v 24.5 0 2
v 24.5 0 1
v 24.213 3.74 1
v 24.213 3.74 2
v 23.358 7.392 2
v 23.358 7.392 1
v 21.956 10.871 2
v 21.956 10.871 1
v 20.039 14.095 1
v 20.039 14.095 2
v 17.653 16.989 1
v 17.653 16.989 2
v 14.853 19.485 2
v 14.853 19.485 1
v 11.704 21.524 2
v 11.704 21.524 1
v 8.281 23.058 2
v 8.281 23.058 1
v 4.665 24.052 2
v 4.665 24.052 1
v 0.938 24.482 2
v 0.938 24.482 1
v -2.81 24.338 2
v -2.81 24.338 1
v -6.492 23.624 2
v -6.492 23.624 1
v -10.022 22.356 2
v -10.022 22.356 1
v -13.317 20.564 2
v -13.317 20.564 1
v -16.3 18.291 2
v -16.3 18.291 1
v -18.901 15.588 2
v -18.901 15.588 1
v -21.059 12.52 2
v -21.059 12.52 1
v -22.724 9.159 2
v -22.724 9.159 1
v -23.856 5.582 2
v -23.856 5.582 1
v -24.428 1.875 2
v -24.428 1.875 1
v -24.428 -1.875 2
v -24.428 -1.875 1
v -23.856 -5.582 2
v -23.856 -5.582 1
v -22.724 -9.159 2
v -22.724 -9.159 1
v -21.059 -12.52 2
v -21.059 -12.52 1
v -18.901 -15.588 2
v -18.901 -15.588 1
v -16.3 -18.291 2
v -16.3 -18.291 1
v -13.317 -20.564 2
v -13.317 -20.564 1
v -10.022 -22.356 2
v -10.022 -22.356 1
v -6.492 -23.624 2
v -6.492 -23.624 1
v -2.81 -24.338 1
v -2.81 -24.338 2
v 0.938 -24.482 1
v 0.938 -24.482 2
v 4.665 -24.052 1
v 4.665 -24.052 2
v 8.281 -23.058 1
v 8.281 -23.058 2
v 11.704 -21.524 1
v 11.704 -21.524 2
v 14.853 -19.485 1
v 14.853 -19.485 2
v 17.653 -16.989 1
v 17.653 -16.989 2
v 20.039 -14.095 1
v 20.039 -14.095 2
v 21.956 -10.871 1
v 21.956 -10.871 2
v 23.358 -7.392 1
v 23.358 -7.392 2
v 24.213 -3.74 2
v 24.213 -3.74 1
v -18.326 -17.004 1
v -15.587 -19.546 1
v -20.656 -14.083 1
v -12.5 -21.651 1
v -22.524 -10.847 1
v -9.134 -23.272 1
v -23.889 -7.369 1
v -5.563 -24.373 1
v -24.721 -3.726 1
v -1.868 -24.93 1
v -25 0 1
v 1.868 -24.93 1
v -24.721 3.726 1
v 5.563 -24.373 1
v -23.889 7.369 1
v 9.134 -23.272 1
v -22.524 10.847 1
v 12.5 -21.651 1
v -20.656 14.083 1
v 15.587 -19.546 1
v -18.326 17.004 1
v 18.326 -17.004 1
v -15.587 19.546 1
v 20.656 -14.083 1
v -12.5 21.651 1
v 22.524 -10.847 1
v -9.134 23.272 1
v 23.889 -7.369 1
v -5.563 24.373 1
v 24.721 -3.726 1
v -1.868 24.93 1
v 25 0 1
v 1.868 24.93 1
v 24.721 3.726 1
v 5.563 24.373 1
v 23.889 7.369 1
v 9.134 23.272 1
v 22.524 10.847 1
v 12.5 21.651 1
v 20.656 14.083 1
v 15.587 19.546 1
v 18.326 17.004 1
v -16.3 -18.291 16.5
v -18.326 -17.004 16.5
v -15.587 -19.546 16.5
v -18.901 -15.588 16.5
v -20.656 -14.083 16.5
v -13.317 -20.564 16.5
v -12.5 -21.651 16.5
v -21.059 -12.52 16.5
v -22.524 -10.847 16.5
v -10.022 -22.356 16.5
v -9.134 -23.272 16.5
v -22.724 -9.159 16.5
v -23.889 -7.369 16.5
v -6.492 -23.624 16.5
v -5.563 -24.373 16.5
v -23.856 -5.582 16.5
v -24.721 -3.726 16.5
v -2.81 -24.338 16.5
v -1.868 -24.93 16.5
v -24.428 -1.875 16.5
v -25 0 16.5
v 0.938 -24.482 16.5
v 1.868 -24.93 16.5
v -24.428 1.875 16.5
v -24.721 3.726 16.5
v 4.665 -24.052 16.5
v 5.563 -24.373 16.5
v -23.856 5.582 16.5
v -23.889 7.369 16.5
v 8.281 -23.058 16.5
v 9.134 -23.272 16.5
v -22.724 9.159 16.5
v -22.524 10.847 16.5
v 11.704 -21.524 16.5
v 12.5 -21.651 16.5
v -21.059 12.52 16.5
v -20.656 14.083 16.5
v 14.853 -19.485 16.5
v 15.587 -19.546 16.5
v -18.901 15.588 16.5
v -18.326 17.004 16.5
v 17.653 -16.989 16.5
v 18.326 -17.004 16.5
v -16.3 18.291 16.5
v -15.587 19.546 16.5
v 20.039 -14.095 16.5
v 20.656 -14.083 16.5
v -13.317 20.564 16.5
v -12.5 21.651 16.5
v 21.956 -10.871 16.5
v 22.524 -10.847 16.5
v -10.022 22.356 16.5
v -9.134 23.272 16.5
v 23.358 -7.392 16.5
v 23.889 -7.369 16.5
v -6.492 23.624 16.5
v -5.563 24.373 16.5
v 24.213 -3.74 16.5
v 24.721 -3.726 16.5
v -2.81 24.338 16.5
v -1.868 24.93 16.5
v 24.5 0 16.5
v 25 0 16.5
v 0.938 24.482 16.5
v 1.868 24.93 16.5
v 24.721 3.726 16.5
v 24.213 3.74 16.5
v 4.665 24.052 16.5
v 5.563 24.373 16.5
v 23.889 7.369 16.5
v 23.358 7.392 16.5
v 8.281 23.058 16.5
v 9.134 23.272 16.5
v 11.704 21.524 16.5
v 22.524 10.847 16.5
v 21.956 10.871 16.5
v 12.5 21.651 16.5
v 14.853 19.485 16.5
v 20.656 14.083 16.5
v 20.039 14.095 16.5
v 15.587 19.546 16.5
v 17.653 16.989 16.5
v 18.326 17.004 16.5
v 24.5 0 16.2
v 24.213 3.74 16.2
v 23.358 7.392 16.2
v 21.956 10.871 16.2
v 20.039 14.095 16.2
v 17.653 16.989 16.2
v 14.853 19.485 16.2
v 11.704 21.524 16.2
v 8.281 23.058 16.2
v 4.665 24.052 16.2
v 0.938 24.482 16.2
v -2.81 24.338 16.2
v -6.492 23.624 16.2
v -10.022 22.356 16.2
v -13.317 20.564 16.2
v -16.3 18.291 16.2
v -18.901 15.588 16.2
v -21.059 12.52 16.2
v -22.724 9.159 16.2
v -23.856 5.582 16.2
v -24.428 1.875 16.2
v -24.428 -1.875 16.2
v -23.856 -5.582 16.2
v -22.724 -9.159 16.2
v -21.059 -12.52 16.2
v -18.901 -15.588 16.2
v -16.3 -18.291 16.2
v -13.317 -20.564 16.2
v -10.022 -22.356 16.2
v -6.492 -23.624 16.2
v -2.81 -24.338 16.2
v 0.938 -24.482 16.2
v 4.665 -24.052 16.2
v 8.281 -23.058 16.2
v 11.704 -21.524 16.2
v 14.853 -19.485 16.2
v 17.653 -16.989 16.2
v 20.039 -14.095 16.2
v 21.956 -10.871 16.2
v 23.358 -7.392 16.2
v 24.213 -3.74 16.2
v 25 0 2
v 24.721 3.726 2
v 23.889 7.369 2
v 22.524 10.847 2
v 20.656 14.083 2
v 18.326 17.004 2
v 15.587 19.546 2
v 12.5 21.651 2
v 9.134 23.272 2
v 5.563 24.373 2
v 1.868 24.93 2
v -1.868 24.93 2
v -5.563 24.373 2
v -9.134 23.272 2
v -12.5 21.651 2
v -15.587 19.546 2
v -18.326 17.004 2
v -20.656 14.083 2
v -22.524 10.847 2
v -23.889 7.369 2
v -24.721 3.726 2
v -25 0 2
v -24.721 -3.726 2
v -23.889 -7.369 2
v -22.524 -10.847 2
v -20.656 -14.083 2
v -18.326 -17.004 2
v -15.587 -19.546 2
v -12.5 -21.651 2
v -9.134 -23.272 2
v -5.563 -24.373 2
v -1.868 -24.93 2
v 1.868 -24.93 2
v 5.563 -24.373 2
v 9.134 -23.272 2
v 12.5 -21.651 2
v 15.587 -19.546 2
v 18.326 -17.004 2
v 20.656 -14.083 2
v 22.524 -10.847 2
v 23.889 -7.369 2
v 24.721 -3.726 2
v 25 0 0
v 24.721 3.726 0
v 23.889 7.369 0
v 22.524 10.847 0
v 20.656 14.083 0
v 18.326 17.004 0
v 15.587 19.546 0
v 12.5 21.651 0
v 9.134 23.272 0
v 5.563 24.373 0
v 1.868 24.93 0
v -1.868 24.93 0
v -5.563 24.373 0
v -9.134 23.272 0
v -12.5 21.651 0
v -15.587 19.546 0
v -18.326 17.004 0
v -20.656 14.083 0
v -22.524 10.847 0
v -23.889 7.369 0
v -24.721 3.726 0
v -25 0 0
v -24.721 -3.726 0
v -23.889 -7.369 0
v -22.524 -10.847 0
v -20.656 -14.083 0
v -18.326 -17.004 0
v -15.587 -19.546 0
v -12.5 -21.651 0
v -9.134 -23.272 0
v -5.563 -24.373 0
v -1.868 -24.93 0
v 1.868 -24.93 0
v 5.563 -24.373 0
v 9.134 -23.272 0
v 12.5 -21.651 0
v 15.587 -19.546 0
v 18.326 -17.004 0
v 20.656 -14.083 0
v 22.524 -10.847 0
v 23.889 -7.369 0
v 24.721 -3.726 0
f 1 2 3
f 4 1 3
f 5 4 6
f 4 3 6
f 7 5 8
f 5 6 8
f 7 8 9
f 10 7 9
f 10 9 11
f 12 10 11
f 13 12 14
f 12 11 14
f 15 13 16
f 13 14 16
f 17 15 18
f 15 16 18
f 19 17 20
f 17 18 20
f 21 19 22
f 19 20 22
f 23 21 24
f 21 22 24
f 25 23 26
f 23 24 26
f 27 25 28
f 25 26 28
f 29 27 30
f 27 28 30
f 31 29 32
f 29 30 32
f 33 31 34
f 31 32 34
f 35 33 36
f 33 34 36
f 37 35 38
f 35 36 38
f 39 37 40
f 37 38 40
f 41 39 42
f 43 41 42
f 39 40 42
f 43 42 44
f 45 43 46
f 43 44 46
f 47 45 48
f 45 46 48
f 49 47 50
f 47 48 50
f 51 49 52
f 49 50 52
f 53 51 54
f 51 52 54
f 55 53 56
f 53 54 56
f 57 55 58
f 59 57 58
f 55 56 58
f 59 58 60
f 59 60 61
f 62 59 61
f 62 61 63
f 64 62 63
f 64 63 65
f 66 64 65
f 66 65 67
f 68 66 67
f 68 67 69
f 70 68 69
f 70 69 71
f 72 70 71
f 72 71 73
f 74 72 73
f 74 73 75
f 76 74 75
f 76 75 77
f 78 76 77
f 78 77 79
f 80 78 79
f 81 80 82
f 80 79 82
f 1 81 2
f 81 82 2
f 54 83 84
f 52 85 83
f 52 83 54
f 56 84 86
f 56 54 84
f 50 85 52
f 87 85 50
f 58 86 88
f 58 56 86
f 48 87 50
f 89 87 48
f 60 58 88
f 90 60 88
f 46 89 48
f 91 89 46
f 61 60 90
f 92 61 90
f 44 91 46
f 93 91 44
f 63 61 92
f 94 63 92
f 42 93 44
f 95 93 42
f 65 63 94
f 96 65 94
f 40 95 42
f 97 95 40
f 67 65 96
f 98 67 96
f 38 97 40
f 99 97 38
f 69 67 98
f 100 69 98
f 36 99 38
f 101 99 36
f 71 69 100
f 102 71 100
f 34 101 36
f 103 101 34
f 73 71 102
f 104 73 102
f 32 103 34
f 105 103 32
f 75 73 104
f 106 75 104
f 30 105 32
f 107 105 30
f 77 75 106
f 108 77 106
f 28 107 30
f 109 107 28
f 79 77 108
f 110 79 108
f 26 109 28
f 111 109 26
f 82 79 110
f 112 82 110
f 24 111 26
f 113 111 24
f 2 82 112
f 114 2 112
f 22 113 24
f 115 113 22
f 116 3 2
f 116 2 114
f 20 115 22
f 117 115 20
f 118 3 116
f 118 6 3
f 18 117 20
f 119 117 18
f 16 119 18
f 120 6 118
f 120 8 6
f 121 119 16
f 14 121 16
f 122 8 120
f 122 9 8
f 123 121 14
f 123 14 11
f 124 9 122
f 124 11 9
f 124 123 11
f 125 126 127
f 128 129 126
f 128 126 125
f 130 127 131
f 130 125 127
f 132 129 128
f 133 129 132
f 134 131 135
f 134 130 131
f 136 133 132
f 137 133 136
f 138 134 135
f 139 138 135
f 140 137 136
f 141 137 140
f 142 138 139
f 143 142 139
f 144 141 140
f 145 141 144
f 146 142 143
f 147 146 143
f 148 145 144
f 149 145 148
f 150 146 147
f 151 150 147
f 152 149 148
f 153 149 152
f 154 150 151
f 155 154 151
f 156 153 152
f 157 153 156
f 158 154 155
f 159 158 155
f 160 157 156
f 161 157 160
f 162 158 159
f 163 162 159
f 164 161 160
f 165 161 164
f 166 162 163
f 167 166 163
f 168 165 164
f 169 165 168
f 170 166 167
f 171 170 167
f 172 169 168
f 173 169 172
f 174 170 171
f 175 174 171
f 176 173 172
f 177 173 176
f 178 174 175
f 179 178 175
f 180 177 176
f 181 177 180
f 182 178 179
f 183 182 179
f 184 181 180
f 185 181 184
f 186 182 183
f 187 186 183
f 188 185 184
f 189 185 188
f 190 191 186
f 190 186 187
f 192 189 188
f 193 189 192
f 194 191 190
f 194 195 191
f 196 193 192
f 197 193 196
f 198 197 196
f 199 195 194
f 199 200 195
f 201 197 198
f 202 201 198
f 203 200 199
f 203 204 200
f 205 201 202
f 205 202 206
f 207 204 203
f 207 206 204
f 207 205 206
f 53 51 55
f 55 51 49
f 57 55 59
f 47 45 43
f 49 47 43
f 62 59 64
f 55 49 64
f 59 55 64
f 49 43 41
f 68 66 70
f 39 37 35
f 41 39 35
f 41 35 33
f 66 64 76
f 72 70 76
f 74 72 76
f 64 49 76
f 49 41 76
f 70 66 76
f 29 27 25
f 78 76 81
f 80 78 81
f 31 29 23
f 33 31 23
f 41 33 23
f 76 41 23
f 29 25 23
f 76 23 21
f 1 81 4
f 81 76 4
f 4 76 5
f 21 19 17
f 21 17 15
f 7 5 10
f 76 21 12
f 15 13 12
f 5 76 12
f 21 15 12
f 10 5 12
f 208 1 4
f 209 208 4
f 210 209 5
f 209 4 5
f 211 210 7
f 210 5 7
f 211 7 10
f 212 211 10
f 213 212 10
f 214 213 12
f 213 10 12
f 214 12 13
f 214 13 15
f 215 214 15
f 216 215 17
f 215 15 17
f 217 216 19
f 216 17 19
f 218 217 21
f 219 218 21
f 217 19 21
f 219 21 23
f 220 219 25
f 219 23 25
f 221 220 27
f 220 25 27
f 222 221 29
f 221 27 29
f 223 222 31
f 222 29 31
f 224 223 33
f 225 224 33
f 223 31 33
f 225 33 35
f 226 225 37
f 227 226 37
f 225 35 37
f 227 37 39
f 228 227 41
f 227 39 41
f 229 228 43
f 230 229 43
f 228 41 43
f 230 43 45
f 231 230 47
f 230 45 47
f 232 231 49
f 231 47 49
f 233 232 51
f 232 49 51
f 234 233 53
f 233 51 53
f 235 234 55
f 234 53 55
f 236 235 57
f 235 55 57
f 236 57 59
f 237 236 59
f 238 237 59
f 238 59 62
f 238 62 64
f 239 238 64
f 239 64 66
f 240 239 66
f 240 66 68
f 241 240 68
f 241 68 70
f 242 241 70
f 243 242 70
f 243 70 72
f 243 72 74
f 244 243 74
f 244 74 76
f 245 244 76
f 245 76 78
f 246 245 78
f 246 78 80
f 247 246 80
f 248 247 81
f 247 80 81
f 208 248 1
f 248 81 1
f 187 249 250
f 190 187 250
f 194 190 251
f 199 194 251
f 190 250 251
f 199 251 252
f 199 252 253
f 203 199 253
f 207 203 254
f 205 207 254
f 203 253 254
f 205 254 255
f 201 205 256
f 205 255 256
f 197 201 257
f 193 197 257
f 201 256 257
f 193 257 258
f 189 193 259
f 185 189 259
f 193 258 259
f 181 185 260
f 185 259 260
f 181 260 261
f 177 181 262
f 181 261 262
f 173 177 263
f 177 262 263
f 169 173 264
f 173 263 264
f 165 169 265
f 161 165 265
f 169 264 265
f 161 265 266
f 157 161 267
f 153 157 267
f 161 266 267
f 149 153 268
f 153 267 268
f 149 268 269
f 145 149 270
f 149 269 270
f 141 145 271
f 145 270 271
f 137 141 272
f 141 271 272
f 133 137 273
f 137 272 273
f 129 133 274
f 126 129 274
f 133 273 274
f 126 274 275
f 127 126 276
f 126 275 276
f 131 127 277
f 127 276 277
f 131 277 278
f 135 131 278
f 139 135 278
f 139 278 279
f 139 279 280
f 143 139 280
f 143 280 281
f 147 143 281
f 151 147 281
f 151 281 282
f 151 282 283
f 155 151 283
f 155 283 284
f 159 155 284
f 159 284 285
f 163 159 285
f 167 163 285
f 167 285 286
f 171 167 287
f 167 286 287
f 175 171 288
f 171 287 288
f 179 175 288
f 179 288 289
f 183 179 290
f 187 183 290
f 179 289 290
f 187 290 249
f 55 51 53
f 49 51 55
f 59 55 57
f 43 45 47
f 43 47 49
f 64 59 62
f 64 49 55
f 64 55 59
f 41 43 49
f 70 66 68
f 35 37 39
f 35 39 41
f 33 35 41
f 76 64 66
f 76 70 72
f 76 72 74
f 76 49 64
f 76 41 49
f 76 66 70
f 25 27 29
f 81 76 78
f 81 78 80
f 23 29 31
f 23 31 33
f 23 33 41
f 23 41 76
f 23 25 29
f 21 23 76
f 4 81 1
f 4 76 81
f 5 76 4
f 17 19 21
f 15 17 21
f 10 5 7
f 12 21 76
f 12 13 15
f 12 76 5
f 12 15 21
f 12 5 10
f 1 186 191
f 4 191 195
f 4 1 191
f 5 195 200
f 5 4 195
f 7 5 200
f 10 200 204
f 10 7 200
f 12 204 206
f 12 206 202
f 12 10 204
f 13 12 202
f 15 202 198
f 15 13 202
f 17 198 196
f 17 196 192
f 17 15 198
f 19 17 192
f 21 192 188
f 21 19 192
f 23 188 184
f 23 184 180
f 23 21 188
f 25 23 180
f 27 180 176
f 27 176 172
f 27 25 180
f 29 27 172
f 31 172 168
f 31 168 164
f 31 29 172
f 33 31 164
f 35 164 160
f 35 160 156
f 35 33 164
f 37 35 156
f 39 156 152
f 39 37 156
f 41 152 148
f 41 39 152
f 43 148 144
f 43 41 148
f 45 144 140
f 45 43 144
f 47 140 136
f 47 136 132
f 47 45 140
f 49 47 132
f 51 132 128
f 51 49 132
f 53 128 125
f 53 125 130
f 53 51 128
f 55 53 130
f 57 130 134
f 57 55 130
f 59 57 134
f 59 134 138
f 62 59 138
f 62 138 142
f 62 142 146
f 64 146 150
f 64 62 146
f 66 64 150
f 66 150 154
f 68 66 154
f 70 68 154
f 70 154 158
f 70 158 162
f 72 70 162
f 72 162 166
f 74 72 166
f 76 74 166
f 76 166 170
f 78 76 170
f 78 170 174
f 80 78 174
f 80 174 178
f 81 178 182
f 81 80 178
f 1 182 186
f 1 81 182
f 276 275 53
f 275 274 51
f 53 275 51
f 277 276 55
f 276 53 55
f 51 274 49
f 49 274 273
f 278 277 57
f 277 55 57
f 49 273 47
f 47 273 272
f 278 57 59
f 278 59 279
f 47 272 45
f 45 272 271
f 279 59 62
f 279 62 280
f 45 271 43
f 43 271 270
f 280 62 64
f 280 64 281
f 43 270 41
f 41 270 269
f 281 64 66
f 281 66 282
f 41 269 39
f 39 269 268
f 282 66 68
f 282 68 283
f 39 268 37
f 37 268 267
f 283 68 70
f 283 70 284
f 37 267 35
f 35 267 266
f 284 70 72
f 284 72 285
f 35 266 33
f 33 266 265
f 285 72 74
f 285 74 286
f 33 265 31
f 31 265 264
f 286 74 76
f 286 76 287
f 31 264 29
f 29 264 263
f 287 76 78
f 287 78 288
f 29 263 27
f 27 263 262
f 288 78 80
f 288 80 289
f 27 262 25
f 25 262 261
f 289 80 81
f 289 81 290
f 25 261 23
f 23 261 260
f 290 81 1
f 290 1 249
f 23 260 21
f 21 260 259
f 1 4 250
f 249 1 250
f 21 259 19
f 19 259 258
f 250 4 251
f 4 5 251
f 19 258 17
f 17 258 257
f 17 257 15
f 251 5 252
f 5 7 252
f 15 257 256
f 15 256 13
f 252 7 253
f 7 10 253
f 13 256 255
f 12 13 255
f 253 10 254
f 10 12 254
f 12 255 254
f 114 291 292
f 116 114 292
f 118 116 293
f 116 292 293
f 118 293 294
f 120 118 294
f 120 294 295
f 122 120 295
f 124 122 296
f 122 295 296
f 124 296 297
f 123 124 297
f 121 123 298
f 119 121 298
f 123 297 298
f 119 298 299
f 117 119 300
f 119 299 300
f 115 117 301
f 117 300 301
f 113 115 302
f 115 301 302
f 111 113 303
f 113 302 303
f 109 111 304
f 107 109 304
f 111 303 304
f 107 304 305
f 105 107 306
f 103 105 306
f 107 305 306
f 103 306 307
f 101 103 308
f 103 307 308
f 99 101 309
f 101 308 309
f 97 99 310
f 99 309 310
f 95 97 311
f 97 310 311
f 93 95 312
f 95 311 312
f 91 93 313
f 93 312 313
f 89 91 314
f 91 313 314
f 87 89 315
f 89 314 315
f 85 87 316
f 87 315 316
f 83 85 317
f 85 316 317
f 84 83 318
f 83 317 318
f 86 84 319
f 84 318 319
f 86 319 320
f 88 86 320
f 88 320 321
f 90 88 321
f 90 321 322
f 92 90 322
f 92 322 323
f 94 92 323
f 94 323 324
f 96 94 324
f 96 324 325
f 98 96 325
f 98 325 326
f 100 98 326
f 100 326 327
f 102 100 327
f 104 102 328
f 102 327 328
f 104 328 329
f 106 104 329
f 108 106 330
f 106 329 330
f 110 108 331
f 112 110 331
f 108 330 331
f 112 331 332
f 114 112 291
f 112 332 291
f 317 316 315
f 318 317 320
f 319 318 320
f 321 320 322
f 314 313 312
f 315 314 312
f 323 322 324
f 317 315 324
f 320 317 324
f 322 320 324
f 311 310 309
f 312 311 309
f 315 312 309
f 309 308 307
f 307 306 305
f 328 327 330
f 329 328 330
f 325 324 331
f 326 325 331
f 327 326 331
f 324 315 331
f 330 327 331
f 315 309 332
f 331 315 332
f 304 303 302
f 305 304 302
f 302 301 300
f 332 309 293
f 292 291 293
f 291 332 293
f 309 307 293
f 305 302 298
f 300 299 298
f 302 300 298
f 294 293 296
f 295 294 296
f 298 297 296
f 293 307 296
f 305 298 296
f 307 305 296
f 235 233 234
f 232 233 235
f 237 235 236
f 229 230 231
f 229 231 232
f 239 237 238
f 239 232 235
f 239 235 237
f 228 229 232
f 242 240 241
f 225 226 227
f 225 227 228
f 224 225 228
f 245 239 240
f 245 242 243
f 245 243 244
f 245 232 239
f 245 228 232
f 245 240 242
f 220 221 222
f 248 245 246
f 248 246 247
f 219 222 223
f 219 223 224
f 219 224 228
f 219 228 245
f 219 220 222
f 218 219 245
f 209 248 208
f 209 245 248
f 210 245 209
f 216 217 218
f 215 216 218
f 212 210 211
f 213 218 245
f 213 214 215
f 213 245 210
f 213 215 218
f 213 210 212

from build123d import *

# Parameters (mm, degrees)
F0_R     = 25
F1_DEPTH = 1
F2_R     = 24.5
F3_DEPTH = 1
F4_R     = 25
F4_R_2   = 24.5
F6_DEPTH = 14.5
F5_R     = 24.5
F7_DEPTH = 14.2


with BuildPart() as f1:
    # F0 (on Top) → F1 (new body)
    with BuildSketch(Plane.XY):
        Circle(F0_R)
    extrude(amount=F1_DEPTH)

    # F2 (on face) → F3 (join)
    with BuildSketch(Plane.XY.offset(1)):
        Circle(F2_R)
    extrude(amount=F3_DEPTH)


with BuildPart() as f6:
    # F4 (on face) → F6 (new body)
    with BuildSketch(Plane.XY.offset(2)):
        Circle(F4_R)
        Circle(F4_R_2, mode=Mode.SUBTRACT)
    extrude(amount=F6_DEPTH)


with BuildPart() as f7:
    # F5 (on face) → F7 (new body)
    with BuildSketch(Plane.XY.offset(2)):
        Circle(F5_R)
    extrude(amount=F7_DEPTH)


solid = Compound([f1.part, f6.part, f7.part])
